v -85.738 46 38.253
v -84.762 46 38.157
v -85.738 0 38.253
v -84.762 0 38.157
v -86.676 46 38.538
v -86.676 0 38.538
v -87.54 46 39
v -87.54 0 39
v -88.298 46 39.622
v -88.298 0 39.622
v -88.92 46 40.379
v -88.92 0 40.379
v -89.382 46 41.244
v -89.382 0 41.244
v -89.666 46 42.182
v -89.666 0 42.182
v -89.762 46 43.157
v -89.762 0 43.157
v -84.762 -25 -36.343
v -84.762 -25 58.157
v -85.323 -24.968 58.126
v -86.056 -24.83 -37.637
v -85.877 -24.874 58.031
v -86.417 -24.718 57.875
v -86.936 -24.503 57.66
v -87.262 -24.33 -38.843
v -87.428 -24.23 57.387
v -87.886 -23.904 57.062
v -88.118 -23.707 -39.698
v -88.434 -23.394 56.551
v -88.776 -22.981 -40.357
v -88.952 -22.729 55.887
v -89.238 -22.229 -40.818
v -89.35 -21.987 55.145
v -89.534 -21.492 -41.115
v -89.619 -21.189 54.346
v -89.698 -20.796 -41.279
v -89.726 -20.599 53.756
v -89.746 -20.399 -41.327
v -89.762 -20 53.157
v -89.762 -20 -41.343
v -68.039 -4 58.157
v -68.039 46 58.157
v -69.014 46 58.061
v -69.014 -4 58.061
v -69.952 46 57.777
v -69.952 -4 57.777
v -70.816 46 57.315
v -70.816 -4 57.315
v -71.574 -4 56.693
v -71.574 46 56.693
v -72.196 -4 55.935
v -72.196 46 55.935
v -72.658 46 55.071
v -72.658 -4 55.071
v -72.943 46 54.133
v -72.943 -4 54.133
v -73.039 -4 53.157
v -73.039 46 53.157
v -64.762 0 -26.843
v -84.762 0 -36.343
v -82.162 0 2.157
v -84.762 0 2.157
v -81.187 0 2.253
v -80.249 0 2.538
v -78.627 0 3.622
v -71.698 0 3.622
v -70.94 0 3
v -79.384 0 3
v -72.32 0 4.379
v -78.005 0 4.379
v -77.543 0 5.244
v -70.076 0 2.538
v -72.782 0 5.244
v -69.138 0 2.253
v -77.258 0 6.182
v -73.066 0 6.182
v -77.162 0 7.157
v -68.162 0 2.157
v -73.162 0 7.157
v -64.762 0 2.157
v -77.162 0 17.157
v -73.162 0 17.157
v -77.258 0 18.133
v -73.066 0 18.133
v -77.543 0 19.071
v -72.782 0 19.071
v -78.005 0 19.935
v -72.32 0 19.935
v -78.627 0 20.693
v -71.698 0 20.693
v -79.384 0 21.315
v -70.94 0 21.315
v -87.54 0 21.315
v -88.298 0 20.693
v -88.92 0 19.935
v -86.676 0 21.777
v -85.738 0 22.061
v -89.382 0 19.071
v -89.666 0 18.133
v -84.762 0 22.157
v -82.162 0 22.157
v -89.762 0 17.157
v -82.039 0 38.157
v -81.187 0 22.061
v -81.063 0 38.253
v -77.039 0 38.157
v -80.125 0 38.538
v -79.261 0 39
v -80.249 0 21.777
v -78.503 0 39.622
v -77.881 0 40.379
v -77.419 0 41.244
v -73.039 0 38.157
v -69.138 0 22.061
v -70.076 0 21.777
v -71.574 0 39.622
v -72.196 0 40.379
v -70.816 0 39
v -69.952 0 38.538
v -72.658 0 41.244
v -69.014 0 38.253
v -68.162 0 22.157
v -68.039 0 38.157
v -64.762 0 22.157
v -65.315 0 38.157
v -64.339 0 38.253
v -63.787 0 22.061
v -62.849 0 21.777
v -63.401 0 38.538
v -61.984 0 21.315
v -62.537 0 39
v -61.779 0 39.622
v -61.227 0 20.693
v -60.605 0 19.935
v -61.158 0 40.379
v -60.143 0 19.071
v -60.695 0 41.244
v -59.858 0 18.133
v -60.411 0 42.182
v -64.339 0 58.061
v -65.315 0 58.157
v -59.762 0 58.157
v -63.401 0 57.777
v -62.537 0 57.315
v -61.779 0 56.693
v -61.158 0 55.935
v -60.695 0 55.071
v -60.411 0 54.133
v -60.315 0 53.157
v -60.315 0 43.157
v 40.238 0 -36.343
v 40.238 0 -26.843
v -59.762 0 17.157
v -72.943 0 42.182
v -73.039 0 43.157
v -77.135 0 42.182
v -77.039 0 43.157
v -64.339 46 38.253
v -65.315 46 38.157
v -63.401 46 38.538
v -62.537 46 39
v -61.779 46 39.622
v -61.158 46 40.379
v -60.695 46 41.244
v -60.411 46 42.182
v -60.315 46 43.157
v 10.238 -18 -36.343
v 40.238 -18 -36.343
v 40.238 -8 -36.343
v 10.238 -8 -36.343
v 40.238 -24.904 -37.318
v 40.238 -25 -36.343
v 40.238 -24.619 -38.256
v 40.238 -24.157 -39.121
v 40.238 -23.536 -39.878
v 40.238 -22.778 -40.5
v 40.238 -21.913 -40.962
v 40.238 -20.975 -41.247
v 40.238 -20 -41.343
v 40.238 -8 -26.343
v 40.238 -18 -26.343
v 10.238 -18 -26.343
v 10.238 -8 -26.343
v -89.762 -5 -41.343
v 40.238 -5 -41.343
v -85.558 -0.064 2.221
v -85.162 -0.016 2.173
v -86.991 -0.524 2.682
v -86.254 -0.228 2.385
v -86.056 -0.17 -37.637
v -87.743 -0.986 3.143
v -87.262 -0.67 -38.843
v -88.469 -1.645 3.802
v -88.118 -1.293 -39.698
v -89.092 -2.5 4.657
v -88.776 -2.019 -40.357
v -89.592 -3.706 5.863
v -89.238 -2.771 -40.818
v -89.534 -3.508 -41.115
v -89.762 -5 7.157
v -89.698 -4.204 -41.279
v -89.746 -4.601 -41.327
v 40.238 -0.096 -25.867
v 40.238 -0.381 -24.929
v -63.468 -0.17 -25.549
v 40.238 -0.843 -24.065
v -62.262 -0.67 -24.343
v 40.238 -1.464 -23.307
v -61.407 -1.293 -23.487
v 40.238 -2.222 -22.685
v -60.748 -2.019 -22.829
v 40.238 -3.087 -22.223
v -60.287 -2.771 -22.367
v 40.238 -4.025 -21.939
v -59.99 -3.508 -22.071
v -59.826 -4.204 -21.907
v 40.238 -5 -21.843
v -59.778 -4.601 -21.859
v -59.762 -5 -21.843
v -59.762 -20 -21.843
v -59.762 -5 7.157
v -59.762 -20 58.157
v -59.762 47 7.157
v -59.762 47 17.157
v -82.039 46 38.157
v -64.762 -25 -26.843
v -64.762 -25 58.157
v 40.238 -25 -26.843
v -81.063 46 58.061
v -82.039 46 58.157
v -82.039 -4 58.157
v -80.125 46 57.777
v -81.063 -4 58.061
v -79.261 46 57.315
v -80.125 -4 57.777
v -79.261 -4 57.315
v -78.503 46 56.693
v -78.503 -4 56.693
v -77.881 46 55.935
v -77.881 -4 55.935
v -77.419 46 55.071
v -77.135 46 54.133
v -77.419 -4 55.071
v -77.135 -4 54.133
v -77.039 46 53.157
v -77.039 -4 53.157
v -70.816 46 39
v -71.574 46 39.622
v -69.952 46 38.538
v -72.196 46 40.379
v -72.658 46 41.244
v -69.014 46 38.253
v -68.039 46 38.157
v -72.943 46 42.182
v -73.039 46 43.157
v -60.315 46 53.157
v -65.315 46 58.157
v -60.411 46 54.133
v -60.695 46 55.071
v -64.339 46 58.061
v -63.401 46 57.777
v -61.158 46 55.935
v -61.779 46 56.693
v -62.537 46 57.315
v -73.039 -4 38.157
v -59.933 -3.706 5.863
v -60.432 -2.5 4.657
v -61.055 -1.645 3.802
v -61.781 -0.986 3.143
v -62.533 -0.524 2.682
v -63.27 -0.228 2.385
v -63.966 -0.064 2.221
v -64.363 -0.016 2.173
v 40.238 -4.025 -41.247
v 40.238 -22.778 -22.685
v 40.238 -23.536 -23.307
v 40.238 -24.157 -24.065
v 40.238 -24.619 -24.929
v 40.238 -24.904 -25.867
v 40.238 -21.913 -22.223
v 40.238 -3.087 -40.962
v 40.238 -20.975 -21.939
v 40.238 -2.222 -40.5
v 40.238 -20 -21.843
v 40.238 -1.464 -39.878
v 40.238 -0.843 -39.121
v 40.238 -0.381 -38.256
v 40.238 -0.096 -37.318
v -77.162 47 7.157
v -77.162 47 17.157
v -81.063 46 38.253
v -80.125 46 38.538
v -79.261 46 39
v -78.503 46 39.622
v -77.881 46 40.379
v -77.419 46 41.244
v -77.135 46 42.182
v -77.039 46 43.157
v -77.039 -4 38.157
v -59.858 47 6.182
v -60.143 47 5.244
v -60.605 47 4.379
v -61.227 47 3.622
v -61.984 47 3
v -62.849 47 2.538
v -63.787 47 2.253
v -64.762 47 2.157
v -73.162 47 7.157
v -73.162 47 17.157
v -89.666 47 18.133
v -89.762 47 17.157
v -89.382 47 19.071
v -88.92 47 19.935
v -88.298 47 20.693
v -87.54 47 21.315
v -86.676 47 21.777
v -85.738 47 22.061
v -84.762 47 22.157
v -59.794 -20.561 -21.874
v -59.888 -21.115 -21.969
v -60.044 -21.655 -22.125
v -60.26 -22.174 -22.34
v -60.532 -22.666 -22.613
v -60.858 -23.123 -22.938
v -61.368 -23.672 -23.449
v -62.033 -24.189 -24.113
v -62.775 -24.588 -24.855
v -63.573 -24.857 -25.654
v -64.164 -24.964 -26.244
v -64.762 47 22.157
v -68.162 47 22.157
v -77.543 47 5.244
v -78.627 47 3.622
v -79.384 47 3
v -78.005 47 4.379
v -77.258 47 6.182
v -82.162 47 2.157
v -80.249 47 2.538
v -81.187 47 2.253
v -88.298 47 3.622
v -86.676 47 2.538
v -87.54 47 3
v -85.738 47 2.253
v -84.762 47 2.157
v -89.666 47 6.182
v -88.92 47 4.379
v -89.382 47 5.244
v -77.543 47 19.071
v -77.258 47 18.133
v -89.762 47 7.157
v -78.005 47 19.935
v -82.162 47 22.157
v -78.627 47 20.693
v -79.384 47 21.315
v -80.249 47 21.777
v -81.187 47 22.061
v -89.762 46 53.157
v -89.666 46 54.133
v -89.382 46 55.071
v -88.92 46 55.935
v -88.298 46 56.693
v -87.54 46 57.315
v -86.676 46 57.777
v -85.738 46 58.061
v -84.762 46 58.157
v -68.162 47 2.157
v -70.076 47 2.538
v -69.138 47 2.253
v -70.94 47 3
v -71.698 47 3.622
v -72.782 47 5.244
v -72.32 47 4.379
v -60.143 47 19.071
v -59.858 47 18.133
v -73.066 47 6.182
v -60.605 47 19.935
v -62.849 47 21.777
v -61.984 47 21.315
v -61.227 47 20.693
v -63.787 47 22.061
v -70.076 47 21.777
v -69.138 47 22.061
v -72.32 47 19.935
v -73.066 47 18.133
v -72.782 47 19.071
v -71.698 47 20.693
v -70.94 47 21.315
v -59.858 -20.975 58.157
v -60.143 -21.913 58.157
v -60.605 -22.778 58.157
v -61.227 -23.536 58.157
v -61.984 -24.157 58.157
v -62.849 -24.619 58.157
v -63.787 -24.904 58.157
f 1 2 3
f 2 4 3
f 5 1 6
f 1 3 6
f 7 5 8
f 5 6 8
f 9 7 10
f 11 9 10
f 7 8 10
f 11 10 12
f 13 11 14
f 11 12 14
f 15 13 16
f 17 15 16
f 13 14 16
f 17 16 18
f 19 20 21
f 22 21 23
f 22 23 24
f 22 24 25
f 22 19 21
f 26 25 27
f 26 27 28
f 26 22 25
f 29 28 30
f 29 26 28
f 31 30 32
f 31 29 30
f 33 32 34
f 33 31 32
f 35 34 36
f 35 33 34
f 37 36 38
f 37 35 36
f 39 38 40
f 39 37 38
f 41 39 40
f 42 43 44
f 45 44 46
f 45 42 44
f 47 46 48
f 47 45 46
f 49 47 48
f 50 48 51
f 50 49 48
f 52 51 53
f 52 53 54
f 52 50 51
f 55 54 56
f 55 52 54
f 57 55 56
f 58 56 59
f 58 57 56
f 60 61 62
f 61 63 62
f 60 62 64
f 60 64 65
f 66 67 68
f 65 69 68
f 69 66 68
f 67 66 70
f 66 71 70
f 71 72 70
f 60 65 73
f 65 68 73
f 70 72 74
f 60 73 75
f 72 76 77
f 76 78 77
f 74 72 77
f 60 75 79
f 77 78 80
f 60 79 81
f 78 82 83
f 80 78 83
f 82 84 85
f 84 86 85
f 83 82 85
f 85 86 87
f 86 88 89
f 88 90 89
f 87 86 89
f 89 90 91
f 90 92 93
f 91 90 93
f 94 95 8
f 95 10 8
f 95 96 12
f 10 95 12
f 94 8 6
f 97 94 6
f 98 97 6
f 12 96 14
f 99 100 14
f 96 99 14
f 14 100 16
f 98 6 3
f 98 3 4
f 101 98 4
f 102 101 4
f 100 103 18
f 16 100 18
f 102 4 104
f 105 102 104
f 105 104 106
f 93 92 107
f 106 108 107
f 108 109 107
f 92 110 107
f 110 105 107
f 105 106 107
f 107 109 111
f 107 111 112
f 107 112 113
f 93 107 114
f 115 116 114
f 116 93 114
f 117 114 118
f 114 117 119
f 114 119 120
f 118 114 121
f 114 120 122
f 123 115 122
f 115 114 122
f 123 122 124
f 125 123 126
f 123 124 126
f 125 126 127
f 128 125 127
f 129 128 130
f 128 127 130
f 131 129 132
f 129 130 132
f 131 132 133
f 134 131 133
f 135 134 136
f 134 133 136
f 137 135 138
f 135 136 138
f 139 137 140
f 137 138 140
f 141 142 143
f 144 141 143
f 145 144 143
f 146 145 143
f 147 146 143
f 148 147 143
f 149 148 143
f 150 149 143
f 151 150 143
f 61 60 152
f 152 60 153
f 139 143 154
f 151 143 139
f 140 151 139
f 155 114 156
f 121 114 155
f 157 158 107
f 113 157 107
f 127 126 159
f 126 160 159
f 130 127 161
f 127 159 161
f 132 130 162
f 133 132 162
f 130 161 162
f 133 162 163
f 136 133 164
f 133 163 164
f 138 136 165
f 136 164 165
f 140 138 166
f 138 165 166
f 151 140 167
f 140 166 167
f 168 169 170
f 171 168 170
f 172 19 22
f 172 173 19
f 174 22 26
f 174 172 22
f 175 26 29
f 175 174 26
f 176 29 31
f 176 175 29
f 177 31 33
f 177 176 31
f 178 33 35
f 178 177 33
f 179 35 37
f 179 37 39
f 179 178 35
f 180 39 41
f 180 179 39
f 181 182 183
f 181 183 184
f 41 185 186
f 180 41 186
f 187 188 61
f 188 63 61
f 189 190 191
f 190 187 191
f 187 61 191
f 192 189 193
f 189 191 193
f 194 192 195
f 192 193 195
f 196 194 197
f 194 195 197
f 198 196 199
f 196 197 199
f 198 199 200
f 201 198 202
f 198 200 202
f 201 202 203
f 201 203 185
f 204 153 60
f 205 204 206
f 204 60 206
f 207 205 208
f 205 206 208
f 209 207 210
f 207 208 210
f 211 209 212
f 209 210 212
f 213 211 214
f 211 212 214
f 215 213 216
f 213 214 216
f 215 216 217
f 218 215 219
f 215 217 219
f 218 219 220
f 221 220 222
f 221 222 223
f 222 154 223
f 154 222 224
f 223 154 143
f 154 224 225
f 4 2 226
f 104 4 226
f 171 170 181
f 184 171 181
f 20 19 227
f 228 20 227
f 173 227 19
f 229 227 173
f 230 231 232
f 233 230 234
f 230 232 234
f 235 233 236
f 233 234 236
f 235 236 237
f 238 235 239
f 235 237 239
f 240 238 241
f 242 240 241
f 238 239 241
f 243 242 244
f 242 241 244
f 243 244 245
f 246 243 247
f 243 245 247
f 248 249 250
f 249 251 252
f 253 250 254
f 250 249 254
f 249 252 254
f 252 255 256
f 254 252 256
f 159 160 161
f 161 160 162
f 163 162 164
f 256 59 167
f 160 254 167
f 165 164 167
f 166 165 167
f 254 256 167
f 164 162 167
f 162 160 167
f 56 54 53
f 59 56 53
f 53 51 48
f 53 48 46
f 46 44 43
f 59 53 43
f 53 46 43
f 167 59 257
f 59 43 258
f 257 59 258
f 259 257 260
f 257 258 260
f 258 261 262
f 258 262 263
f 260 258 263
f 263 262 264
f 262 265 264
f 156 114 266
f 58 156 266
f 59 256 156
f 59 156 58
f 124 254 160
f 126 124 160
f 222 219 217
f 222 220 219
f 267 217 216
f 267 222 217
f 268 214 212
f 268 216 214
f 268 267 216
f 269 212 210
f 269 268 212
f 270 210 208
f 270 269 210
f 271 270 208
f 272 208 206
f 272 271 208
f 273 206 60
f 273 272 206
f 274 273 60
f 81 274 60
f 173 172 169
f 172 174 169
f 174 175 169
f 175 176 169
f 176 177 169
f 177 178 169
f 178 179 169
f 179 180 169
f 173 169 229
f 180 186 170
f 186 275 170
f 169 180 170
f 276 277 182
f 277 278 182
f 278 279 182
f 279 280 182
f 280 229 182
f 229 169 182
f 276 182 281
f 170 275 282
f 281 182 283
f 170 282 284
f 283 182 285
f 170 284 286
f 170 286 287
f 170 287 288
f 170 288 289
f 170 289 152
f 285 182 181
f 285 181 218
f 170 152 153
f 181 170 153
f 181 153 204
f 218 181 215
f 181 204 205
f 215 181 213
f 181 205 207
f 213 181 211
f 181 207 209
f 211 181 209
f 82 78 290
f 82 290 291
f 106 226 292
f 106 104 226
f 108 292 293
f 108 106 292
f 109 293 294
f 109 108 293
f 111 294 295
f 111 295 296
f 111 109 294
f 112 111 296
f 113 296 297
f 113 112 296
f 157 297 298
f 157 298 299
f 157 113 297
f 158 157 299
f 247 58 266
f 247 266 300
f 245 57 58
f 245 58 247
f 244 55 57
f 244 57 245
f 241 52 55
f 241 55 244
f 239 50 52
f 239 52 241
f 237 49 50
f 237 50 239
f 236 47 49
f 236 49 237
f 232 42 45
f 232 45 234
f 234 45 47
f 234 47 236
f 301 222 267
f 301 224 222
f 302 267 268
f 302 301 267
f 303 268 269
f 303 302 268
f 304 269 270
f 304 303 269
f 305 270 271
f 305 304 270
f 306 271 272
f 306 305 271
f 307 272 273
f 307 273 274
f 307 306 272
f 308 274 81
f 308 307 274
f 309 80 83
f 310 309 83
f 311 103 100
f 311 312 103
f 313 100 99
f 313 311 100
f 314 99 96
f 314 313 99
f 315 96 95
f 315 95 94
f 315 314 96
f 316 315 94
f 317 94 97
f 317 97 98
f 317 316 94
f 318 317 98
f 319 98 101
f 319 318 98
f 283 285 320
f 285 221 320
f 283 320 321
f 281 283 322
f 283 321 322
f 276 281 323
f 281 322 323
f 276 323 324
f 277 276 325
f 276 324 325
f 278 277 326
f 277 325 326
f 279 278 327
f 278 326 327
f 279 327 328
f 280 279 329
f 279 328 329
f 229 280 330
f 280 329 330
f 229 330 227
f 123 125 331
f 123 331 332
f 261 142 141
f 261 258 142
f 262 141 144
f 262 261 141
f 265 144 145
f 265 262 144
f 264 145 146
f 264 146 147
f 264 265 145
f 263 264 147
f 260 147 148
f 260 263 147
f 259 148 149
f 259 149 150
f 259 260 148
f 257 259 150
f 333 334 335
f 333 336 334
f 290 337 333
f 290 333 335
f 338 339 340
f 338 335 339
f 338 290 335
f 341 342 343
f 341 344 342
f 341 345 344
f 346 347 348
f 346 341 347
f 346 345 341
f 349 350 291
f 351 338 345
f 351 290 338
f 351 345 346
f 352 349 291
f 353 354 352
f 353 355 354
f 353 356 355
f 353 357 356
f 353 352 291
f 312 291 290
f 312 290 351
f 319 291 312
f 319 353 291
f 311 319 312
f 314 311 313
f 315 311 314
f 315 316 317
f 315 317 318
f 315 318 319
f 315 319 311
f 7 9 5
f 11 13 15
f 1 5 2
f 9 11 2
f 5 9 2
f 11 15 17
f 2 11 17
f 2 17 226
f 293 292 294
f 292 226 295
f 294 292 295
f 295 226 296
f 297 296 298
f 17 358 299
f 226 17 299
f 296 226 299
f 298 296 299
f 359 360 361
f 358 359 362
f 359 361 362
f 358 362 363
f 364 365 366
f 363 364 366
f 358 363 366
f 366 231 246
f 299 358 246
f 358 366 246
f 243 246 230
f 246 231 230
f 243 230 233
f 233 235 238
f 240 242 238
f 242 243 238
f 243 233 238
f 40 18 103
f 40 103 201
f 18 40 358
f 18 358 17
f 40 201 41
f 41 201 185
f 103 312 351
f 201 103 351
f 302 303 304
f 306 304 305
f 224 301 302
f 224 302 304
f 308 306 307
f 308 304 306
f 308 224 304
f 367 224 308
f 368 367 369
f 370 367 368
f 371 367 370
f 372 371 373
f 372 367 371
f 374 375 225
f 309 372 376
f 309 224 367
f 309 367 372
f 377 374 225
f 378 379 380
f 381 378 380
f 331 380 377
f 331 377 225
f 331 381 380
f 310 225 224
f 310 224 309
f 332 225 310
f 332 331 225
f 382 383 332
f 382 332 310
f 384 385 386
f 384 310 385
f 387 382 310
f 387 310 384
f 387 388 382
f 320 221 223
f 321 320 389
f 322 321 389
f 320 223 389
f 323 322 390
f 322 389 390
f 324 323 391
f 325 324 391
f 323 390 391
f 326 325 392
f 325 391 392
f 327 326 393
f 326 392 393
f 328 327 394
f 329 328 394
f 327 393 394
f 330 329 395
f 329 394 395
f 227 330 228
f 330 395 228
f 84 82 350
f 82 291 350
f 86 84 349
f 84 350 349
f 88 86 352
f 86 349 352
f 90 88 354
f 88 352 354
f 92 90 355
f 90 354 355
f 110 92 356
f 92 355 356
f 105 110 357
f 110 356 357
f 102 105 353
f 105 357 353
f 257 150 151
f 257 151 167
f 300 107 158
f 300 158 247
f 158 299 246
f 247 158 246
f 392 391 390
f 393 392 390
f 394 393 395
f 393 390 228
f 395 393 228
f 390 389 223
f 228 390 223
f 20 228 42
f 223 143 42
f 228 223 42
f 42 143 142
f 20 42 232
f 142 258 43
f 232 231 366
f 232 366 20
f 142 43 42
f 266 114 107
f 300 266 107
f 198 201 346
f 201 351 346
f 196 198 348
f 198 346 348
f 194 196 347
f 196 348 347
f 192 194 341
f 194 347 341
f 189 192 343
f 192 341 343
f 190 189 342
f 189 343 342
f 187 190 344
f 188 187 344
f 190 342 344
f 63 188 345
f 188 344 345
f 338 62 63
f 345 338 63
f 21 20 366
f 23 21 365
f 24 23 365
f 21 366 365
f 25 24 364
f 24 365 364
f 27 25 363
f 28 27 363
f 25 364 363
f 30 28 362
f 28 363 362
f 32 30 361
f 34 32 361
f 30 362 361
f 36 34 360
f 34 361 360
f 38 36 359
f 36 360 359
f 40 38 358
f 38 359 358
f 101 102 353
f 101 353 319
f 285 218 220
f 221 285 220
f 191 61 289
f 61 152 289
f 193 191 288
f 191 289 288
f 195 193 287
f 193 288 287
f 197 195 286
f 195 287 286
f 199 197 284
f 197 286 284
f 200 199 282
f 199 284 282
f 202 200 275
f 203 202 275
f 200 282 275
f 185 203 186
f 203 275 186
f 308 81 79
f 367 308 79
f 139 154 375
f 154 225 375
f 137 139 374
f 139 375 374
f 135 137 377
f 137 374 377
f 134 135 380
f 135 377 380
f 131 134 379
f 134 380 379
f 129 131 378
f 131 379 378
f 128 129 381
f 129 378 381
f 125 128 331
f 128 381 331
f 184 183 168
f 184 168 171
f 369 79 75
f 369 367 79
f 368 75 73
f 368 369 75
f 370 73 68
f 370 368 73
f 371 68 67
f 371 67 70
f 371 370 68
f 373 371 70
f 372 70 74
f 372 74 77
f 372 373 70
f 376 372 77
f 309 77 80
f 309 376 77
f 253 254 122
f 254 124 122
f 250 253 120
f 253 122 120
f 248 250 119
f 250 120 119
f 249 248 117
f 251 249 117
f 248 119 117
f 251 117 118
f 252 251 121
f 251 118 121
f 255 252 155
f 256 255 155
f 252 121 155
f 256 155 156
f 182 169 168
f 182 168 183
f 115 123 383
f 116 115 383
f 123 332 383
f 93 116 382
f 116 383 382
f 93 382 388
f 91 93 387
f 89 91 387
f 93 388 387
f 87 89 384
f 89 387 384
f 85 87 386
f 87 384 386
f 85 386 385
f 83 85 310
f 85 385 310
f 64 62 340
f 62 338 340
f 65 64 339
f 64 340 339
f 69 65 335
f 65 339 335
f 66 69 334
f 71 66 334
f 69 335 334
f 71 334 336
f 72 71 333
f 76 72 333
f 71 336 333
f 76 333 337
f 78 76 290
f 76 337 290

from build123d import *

# Parameters (mm, degrees)
F1_DEPTH      = 25
F2_W          = 29.447394362
F2_H          = 9.0000005439
F2_H_2        = 45.9999994561
F3_DEPTH      = 20
F4_W          = 4
F4_H          = 20
F5_DEPTH      = 50
F6_W          = 13.4000085294
F6_H          = 20
F6_W_2        = 12.5999914706
F7_DEPTH      = 47
F7_DEPTH_BACK = 10
F8_W          = 10
F8_H          = 10
F9_DEPTH      = 30
F10_R         = 5


with BuildPart() as f1:
    # F0 (on Front) → F1 (new body)
    with BuildSketch(Plane.XZ):
        Polygon((-89.7622789443, -41.3427457391), (40.2377210557, -41.3427457391), (40.2377210557, -41.1998914442), (40.2377210557, -21.8427457391), (-59.7622789443, -21.8427457391), (-59.7622789443, 58.1572542609), (-89.7622789443, 58.1572542609), align=None)
    extrude(amount=F1_DEPTH)

    # F2 (on face) → F3 (join)
    with BuildSketch(Plane.XY.offset(58.1572542609)):
        with Locations((-75.0385817632, -4.5000002719)):
            Rectangle(F2_W, F2_H)
        with Locations((-75.0385817632, 22.9999997281)):
            Rectangle(F2_W, F2_H_2)
    extrude(amount=-F3_DEPTH)

    # F4 (on face) → F5 (cut)
    with BuildSketch(Plane(origin=(0, 45.9999994561, 0), x_dir=(-1, 0, 0), z_dir=(0, 1, 0))):
        with Locations((75.038585484, 48.1572542609)):
            Rectangle(F4_W, F4_H)
    extrude(amount=-F5_DEPTH, mode=Mode.SUBTRACT)

    # F6 (on face) → F7 (join, two sides)
    with BuildSketch(Plane(origin=(0, 0, 0), x_dir=(-1, 0, 0), z_dir=(0, 1, 0))) as f7_sk:
        with Locations((66.462283209, 12.1572542609)):
            Rectangle(F6_W, F6_H)
        with Locations((83.462283209, 12.1572542609)):
            Rectangle(F6_W_2, F6_H)
    extrude(amount=F7_DEPTH)
    extrude(f7_sk.sketch, amount=-F7_DEPTH_BACK)

    # F8 (on face) → F9 (cut)
    with BuildSketch(Plane.YZ.offset(40.2377210557)):
        with Locations((-13, -31.3427457391)):
            Rectangle(F8_W, F8_H)
    extrude(amount=-F9_DEPTH, mode=Mode.SUBTRACT)

    # F10
    f10_edges = [f1.edges().sort_by_distance(p)[0] for p in [
        (-60.314885, 23, 58.157254),
        (-73.038585, 20.999999, 58.157254),
        (-60.314885, 23, 38.157254),
        (-73.038585, 23, 38.157254),
        (-77.038585, 23, 38.157254),
        (-89.762279, 23, 38.157254),
        (-89.762279, 10.5, 58.157254),
        (-77.038585, 20.999999, 58.157254),
        (-89.762279, 23.5, 2.157254),
        (-89.762279, 23.5, 22.157254),
        (-77.162287, 23.5, 22.157254),
        (-77.162287, 23.5, 2.157254),
        (-73.162287, 23.5, 2.157254),
        (-59.762279, 23.5, 2.157254),
        (-59.762279, 23.5, 22.157254),
        (-73.162287, 23.5, 22.157254),
        (-9.762279, 0, -21.842746),
        (-24.762279, 0, -41.342746),
        (-89.762279, 0, -19.592746),
        (-59.762279, 0, -9.842746),
        (-89.762279, -25, 8.407254),
        (-24.762279, -25, -41.342746),
        (-9.762279, -25, -21.842746),
        (-59.762279, -25, 18.157254),
    ]]
    fillet(f10_edges, radius=F10_R)


solid = f1.part
